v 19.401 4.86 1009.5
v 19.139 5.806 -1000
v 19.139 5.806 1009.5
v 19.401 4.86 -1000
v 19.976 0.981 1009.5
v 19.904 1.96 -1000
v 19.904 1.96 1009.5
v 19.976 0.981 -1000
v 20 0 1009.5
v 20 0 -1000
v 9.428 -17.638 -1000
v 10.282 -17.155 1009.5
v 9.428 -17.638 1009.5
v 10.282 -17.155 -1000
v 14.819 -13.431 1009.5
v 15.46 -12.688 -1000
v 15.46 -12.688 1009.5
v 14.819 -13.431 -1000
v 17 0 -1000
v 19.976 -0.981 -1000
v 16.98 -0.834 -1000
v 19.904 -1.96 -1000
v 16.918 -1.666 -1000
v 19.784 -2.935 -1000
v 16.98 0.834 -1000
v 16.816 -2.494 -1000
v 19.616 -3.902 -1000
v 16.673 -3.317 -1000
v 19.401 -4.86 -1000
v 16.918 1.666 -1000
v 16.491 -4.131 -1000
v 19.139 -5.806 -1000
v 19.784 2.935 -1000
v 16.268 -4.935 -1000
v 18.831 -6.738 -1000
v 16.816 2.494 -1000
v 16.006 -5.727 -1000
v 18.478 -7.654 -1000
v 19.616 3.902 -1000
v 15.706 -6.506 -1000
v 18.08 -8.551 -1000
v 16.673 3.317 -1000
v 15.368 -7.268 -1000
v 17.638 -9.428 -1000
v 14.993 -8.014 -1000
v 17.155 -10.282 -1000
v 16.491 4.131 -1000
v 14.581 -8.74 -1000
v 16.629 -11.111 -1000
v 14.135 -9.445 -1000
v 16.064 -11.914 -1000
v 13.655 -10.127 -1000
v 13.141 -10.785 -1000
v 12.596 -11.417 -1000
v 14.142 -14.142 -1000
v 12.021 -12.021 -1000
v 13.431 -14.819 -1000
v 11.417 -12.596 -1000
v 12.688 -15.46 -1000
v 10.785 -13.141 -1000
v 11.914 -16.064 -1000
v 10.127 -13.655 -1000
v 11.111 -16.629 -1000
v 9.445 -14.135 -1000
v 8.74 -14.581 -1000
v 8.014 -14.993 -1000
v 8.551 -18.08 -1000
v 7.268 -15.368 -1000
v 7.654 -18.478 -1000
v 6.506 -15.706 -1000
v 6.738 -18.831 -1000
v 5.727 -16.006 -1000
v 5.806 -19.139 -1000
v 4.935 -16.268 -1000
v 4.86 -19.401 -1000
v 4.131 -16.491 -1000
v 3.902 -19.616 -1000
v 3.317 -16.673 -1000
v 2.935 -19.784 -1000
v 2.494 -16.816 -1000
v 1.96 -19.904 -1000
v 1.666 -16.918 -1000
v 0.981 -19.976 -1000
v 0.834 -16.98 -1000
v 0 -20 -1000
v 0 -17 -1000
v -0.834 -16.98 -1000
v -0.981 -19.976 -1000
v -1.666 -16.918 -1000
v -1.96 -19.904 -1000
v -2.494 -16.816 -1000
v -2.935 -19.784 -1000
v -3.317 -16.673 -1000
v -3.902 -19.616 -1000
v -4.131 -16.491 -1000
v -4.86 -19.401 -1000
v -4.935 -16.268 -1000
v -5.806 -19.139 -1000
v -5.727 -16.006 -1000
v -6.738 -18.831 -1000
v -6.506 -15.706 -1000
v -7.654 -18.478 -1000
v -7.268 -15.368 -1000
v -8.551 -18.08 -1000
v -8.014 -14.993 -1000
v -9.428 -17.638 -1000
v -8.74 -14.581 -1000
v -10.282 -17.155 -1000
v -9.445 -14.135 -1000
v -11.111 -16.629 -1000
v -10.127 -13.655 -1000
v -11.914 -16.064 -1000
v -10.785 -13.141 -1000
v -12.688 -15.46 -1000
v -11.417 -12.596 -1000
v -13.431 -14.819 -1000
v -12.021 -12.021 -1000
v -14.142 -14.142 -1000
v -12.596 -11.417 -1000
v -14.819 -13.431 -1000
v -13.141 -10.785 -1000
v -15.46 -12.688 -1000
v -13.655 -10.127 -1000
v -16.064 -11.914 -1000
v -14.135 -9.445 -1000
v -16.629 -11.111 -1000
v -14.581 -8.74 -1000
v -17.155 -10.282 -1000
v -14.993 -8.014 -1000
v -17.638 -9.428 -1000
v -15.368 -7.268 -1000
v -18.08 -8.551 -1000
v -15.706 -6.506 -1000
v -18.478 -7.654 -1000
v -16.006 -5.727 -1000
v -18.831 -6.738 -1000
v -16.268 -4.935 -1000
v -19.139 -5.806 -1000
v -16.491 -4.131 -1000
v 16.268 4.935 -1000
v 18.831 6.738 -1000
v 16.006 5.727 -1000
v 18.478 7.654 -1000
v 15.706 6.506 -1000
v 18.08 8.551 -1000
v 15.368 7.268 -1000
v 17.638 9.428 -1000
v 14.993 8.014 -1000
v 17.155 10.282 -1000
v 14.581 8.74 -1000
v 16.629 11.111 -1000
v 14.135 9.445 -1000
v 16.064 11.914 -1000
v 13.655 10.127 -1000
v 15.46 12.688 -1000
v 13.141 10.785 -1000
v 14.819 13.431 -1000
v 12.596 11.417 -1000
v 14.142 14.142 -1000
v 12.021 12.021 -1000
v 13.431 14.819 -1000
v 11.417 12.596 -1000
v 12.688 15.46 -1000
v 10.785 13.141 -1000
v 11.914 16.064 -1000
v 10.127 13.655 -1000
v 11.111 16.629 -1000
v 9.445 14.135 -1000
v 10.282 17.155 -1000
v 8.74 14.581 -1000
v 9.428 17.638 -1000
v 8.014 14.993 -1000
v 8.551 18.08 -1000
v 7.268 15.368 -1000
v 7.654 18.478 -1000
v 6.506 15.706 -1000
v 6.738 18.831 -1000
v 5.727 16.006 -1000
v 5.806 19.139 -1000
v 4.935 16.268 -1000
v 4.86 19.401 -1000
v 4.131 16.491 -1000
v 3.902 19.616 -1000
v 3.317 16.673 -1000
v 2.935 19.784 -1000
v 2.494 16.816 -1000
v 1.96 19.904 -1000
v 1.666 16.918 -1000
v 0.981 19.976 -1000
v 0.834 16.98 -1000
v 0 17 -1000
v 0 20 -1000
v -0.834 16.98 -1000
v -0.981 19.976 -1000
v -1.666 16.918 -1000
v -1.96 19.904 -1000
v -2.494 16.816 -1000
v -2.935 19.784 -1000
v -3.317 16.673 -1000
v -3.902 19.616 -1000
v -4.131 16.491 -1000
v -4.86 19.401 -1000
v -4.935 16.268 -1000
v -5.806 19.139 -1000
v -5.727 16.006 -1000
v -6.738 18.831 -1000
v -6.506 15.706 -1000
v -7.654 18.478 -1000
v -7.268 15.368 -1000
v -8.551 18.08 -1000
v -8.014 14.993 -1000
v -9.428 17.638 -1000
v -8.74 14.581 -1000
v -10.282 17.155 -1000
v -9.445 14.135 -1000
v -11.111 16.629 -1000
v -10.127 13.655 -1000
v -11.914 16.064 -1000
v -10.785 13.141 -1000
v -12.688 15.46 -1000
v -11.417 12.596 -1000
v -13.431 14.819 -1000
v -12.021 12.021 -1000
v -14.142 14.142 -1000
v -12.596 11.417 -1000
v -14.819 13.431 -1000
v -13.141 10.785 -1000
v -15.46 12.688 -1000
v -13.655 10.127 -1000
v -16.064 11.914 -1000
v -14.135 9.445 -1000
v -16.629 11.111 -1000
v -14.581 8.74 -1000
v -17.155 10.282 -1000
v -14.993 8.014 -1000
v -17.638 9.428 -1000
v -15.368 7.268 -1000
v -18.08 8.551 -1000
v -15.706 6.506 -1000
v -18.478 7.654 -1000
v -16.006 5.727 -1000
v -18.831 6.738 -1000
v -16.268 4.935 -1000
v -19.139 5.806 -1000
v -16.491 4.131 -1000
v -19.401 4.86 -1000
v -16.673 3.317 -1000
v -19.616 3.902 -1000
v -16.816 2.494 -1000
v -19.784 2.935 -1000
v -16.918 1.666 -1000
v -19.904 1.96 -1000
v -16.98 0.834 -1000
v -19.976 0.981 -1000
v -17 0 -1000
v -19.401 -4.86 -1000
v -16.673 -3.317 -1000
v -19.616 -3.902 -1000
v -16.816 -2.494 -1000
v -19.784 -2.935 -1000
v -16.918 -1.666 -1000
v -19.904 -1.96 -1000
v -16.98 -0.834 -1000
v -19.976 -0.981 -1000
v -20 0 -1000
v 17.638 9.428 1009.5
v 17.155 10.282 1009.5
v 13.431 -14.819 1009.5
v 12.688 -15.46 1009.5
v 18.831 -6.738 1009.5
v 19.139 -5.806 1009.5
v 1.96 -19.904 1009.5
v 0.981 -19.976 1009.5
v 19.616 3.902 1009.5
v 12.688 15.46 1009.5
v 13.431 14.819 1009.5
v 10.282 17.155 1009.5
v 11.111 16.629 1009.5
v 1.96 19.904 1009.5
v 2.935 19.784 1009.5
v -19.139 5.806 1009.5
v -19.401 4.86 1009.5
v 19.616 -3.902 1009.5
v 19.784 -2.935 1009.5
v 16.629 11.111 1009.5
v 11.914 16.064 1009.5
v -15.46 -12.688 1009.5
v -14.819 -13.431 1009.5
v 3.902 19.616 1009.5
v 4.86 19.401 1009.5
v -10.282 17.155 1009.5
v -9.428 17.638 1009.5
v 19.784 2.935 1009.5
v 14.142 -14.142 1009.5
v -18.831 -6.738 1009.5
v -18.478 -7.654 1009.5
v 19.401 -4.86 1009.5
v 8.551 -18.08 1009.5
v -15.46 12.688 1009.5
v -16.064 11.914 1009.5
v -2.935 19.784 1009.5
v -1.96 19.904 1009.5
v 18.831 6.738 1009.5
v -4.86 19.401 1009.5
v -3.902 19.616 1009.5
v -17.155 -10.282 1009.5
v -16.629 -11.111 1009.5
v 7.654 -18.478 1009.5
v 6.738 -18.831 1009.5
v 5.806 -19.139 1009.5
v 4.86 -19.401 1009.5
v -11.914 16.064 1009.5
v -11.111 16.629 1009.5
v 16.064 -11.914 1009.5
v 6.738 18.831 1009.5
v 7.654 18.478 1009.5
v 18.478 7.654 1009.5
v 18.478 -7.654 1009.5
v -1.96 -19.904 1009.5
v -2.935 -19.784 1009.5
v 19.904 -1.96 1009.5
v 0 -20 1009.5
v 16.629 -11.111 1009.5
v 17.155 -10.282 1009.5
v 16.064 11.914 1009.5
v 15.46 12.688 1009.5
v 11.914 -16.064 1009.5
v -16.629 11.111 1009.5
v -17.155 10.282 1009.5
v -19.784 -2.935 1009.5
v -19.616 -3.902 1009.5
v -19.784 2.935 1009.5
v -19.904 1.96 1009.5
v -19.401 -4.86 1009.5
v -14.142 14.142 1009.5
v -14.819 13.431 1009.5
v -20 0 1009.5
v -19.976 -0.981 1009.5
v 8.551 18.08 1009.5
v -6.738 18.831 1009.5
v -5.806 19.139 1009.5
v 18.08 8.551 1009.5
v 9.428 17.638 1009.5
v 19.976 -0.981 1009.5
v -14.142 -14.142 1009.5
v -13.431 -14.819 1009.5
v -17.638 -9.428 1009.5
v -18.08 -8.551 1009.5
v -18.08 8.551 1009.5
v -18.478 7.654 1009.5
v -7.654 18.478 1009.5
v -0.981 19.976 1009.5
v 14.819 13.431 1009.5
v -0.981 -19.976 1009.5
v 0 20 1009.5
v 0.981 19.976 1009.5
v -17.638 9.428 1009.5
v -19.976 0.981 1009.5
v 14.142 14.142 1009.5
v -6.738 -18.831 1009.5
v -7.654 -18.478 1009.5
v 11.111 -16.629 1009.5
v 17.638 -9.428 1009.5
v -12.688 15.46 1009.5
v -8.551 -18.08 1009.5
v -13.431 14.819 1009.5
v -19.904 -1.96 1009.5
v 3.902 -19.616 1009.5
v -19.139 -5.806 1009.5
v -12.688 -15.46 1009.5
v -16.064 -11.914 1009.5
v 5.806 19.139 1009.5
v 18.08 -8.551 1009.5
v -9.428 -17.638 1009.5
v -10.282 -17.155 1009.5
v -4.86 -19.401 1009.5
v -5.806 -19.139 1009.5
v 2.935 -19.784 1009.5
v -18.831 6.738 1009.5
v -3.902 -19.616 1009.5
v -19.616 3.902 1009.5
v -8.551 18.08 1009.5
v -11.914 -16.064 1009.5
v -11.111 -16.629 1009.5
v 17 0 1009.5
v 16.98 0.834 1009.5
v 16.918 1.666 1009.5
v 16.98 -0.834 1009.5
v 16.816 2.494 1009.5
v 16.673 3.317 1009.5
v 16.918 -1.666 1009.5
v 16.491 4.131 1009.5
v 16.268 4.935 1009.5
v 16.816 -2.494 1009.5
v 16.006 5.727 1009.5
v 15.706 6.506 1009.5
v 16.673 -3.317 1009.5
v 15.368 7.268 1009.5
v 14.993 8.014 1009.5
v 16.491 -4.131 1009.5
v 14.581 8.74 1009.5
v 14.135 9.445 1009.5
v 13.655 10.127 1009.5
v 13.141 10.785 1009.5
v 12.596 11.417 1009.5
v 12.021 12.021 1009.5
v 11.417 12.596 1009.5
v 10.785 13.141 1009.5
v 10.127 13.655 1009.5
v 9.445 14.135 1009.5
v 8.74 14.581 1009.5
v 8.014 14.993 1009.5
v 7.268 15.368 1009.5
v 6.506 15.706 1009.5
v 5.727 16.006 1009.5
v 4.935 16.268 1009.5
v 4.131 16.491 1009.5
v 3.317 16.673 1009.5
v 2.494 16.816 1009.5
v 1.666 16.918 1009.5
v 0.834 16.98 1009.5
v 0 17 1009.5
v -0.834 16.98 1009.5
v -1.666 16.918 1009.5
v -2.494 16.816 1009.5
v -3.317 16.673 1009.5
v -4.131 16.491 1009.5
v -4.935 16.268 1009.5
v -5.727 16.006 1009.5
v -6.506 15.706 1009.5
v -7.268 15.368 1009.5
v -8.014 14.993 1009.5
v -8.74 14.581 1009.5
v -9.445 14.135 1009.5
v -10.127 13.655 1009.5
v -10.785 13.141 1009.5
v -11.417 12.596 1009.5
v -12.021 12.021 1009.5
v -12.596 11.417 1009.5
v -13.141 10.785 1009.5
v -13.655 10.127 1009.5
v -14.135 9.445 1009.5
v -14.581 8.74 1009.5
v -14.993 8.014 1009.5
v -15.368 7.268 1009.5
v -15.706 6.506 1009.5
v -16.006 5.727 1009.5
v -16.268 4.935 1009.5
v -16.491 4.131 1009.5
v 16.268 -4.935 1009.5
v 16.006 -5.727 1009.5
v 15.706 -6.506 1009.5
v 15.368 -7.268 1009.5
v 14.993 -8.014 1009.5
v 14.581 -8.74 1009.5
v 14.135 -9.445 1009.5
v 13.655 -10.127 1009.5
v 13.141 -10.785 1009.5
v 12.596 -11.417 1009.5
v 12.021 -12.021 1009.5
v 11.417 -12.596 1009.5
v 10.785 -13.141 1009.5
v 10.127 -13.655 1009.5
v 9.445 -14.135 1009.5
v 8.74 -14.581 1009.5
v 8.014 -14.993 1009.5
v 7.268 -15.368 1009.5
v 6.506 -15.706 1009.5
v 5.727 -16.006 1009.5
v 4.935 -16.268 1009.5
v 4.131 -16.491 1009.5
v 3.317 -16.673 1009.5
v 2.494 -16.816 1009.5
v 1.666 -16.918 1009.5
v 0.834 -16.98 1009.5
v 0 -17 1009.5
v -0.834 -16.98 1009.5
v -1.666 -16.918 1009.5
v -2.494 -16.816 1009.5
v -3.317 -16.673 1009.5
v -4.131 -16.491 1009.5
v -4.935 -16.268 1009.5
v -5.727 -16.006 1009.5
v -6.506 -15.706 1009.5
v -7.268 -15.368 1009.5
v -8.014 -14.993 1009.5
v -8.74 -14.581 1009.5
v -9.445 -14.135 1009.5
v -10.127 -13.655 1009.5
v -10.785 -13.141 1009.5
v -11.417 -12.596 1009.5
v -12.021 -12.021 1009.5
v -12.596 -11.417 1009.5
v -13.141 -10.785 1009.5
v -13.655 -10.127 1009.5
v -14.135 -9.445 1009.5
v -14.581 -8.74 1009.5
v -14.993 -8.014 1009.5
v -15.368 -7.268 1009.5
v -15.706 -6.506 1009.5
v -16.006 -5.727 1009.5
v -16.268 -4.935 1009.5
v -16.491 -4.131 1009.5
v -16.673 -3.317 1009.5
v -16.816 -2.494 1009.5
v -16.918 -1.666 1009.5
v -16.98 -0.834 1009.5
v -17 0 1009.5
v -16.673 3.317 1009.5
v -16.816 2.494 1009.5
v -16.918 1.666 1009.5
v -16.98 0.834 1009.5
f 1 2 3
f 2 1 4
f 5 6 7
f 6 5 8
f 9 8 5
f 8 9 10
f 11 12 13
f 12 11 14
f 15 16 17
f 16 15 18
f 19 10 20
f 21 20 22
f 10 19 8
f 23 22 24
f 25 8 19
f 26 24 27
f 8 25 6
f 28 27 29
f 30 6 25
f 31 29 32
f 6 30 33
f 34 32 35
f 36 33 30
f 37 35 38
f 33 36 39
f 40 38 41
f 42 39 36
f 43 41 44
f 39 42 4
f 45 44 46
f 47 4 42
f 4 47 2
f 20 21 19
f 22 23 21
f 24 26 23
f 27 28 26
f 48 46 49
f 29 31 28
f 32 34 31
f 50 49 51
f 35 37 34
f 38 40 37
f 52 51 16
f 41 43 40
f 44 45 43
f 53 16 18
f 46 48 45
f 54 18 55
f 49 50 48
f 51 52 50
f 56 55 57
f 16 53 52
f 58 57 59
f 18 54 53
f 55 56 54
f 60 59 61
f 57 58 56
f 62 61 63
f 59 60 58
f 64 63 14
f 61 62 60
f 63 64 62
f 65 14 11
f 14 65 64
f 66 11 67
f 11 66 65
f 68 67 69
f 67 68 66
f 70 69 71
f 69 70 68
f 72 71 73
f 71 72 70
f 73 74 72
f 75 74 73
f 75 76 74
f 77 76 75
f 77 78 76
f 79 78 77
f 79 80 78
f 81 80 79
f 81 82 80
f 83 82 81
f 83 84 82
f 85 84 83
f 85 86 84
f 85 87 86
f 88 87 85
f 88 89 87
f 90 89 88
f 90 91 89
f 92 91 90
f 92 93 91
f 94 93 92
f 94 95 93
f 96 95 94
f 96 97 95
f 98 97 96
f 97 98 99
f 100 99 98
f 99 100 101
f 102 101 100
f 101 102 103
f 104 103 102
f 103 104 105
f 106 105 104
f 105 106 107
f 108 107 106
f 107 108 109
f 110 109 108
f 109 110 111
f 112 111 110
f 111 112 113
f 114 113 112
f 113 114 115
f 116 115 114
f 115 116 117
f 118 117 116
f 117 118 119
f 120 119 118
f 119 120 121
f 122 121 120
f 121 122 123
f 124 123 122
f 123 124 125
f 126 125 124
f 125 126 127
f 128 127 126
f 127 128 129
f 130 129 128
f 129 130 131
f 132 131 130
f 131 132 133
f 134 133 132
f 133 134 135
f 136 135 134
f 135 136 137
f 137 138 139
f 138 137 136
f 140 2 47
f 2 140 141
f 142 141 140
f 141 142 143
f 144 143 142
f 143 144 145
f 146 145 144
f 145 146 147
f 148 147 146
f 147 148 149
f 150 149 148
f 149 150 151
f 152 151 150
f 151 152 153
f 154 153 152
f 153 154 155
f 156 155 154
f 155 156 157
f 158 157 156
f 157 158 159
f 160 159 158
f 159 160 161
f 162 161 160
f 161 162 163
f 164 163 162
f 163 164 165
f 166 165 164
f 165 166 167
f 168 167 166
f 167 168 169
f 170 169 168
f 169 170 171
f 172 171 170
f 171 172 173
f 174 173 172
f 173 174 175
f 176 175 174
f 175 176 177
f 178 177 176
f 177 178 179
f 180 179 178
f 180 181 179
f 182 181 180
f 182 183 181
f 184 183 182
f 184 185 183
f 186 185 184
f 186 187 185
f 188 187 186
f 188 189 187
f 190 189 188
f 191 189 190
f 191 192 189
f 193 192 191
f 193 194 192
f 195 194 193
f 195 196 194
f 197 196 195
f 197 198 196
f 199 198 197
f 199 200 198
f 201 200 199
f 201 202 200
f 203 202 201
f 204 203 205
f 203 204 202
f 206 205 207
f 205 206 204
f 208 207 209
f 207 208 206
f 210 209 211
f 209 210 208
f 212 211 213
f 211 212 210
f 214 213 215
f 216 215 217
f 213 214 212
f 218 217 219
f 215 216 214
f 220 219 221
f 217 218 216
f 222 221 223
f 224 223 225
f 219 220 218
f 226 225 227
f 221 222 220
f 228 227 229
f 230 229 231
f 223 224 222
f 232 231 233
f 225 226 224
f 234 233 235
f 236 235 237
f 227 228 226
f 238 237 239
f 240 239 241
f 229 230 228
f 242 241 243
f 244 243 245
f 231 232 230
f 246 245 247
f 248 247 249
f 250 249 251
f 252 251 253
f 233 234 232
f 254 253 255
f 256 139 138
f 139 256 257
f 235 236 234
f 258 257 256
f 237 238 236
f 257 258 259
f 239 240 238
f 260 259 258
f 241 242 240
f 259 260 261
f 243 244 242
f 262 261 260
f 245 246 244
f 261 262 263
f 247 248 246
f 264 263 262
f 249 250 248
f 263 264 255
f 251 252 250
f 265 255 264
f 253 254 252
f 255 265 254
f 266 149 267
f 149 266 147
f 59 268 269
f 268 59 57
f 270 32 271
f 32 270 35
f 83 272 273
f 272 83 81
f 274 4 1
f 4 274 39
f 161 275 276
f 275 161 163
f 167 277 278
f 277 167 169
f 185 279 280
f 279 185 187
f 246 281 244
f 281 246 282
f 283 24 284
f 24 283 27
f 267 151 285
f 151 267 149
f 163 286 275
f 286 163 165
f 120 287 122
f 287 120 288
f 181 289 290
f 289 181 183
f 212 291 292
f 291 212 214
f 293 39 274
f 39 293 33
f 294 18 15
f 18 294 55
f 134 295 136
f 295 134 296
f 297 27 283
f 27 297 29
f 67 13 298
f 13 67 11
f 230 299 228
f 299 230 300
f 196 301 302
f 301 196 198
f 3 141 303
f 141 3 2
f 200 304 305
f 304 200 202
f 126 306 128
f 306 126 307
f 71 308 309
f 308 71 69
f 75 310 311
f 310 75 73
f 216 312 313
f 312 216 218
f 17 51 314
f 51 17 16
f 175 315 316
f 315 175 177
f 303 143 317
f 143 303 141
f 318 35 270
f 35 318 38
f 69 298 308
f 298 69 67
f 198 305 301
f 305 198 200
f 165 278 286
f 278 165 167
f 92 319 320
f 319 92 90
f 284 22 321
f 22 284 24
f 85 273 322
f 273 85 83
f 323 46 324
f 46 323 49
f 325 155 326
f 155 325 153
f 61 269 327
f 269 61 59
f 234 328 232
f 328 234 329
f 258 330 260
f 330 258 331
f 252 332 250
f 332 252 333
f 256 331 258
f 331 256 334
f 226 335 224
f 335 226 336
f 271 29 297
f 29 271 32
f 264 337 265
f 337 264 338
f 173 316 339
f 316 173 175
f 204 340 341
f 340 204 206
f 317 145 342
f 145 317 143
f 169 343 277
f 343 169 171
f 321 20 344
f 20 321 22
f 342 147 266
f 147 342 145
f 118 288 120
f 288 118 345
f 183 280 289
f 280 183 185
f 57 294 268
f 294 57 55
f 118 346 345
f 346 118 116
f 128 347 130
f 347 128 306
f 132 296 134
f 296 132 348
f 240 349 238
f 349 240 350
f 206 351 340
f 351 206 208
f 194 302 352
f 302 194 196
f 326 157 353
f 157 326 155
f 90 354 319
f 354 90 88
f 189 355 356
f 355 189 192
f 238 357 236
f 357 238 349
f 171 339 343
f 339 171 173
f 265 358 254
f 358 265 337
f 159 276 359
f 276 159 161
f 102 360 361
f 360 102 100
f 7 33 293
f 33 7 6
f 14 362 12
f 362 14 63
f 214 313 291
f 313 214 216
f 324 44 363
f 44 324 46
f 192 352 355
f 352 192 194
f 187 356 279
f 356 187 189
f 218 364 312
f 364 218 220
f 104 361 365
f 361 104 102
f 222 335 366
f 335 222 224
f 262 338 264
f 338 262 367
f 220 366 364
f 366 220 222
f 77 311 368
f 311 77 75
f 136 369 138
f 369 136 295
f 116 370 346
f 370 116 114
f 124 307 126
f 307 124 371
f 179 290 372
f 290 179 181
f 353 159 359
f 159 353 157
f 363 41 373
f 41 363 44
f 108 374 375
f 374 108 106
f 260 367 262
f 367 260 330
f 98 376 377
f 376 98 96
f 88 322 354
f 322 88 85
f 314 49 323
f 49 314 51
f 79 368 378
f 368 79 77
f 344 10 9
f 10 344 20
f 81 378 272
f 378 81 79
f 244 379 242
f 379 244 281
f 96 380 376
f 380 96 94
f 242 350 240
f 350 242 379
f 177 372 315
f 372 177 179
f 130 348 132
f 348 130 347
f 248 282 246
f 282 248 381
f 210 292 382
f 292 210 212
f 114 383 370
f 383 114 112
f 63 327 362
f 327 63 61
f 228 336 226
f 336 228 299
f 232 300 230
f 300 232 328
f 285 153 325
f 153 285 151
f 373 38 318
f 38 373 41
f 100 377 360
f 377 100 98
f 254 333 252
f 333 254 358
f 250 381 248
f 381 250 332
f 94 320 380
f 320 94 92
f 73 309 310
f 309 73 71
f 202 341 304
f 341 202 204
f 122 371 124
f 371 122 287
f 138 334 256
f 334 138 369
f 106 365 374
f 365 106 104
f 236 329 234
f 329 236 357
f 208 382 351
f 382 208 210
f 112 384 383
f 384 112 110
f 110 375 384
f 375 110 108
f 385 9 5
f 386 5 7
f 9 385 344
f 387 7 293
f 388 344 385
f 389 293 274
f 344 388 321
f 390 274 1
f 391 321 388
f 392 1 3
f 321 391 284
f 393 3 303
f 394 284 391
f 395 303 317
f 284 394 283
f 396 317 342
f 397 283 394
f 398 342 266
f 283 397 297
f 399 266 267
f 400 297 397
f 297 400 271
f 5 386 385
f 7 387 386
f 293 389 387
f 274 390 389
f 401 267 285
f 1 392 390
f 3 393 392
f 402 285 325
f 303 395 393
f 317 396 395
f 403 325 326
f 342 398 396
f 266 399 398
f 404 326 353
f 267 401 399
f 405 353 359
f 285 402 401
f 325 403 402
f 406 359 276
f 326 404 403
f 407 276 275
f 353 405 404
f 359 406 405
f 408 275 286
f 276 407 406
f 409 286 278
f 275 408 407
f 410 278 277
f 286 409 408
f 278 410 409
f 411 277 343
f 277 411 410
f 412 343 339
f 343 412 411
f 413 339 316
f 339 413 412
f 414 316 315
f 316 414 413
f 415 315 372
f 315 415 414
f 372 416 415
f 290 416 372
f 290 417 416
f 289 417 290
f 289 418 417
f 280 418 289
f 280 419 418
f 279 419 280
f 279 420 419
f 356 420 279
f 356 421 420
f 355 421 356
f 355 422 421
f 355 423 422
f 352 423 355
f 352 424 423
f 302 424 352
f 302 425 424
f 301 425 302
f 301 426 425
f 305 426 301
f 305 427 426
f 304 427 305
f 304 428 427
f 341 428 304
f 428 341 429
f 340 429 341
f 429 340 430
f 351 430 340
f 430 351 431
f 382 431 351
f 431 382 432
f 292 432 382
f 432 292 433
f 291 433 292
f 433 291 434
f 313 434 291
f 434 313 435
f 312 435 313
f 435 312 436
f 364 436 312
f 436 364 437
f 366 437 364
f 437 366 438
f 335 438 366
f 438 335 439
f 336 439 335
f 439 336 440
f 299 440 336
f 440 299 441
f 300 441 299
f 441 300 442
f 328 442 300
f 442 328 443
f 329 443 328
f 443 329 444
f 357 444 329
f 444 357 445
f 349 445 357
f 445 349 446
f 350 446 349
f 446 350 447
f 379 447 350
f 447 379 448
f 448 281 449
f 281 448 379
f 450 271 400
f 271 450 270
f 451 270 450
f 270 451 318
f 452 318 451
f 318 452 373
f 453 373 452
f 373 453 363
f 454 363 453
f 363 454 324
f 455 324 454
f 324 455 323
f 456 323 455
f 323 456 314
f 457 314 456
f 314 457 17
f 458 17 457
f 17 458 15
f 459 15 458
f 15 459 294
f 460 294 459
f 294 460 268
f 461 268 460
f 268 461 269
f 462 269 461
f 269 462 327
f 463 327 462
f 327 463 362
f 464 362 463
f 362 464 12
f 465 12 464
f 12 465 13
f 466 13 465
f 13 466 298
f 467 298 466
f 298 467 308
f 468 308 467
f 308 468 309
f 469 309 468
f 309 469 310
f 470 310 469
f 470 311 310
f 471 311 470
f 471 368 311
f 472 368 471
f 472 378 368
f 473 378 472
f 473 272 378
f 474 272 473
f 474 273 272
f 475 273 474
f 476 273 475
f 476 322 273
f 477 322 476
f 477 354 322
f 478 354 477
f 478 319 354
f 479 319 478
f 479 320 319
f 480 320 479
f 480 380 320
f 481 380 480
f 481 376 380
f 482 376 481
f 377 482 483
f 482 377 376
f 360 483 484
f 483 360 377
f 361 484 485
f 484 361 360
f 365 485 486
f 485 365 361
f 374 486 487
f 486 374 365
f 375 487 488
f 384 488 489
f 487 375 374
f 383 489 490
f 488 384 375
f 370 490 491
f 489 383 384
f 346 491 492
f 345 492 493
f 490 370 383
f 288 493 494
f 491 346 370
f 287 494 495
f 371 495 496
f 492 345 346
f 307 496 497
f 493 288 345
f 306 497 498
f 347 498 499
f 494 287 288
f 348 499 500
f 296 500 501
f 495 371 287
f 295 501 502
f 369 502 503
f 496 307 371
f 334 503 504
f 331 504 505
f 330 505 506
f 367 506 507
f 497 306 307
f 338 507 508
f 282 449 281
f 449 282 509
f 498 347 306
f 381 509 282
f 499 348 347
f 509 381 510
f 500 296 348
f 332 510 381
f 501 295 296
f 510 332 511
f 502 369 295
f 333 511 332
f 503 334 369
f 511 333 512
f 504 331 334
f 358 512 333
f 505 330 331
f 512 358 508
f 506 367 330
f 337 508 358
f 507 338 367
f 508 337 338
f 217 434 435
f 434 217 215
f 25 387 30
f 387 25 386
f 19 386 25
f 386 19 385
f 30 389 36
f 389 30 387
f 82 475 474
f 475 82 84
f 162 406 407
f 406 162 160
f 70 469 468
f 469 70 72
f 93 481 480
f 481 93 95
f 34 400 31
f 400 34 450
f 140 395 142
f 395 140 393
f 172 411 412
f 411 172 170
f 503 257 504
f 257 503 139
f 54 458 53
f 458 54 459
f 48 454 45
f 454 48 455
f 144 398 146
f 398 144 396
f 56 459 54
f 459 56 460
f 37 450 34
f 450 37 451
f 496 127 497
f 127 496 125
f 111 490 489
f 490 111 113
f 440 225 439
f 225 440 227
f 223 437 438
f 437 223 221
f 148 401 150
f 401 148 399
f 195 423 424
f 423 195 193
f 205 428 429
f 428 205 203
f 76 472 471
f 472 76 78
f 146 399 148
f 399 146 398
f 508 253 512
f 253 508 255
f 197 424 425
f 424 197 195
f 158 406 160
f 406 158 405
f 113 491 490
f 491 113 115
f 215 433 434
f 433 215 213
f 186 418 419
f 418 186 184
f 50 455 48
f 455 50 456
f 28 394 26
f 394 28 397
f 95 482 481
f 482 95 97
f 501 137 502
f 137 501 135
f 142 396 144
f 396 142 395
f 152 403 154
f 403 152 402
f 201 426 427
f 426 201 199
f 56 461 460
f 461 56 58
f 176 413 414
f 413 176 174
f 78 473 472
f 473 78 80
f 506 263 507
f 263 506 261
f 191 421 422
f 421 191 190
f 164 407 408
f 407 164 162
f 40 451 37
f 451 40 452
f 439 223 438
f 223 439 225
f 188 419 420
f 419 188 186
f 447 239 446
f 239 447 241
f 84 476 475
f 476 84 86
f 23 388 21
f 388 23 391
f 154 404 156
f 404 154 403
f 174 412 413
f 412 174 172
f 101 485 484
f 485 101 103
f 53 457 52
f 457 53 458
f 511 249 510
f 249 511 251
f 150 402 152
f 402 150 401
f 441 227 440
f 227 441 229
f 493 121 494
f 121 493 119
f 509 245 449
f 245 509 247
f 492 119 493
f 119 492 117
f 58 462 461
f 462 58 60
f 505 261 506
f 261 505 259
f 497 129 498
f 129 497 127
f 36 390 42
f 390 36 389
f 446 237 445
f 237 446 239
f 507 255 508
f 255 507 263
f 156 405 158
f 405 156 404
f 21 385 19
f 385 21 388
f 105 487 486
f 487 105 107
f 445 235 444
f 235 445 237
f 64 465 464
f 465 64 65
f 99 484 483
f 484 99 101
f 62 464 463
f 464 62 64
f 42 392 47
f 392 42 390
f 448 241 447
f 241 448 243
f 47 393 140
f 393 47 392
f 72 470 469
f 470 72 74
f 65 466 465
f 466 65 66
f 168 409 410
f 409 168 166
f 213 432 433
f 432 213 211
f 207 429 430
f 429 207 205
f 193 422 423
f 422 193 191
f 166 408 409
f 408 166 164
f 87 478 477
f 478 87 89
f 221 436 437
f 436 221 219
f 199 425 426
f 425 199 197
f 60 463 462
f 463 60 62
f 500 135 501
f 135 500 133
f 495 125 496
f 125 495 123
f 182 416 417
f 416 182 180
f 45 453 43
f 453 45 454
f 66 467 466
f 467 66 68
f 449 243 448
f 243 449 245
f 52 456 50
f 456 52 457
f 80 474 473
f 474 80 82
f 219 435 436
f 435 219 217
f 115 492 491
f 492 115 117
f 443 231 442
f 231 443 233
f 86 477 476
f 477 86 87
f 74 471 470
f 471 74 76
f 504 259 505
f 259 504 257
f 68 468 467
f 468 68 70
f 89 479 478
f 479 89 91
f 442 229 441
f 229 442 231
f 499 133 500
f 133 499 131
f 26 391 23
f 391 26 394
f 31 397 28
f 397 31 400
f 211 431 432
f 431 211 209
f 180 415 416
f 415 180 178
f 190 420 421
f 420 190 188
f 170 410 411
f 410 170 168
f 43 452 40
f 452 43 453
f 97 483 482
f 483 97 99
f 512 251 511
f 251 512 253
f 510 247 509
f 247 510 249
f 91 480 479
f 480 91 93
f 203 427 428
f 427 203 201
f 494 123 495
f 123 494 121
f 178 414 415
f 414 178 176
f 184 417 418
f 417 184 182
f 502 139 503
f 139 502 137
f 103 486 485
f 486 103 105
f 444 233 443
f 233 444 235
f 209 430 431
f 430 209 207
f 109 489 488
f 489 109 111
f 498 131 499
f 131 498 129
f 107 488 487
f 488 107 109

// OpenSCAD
// HT 40 pipe 2000 mm (single connected solid)

// Parameters
pipe_diameter  = 40;    // outer diameter (mm)
pipe_thickness = 3;     // wall thickness (mm)
pipe_length    = 2000;  // length (mm)

socket_length  = 10;    // end socket length (mm)
overlap        = 0.5;   // overlap to guarantee connectivity (mm)

$fn = 128;

module ht_pipe() {
    inner_d = pipe_diameter - 2*pipe_thickness;

    // Build as one connected solid: outer union minus inner void union
    difference() {
        union() {
            // Outer main pipe
            cylinder(h=pipe_length, d=pipe_diameter, center=true);

            // Outer socket (same OD), overlapped into main pipe
            translate([0, 0, pipe_length/2 + socket_length/2 - overlap])
                cylinder(h=socket_length, d=pipe_diameter, center=true);
        }

        union() {
            // Inner void for main pipe (slightly longer to ensure clean subtraction)
            cylinder(h=pipe_length + 2, d=inner_d, center=true);

            // Inner void for socket (also slightly longer), aligned with socket
            translate([0, 0, pipe_length/2 + socket_length/2 - overlap])
                cylinder(h=socket_length + 2, d=inner_d, center=true);
        }
    }
}

ht_pipe();
